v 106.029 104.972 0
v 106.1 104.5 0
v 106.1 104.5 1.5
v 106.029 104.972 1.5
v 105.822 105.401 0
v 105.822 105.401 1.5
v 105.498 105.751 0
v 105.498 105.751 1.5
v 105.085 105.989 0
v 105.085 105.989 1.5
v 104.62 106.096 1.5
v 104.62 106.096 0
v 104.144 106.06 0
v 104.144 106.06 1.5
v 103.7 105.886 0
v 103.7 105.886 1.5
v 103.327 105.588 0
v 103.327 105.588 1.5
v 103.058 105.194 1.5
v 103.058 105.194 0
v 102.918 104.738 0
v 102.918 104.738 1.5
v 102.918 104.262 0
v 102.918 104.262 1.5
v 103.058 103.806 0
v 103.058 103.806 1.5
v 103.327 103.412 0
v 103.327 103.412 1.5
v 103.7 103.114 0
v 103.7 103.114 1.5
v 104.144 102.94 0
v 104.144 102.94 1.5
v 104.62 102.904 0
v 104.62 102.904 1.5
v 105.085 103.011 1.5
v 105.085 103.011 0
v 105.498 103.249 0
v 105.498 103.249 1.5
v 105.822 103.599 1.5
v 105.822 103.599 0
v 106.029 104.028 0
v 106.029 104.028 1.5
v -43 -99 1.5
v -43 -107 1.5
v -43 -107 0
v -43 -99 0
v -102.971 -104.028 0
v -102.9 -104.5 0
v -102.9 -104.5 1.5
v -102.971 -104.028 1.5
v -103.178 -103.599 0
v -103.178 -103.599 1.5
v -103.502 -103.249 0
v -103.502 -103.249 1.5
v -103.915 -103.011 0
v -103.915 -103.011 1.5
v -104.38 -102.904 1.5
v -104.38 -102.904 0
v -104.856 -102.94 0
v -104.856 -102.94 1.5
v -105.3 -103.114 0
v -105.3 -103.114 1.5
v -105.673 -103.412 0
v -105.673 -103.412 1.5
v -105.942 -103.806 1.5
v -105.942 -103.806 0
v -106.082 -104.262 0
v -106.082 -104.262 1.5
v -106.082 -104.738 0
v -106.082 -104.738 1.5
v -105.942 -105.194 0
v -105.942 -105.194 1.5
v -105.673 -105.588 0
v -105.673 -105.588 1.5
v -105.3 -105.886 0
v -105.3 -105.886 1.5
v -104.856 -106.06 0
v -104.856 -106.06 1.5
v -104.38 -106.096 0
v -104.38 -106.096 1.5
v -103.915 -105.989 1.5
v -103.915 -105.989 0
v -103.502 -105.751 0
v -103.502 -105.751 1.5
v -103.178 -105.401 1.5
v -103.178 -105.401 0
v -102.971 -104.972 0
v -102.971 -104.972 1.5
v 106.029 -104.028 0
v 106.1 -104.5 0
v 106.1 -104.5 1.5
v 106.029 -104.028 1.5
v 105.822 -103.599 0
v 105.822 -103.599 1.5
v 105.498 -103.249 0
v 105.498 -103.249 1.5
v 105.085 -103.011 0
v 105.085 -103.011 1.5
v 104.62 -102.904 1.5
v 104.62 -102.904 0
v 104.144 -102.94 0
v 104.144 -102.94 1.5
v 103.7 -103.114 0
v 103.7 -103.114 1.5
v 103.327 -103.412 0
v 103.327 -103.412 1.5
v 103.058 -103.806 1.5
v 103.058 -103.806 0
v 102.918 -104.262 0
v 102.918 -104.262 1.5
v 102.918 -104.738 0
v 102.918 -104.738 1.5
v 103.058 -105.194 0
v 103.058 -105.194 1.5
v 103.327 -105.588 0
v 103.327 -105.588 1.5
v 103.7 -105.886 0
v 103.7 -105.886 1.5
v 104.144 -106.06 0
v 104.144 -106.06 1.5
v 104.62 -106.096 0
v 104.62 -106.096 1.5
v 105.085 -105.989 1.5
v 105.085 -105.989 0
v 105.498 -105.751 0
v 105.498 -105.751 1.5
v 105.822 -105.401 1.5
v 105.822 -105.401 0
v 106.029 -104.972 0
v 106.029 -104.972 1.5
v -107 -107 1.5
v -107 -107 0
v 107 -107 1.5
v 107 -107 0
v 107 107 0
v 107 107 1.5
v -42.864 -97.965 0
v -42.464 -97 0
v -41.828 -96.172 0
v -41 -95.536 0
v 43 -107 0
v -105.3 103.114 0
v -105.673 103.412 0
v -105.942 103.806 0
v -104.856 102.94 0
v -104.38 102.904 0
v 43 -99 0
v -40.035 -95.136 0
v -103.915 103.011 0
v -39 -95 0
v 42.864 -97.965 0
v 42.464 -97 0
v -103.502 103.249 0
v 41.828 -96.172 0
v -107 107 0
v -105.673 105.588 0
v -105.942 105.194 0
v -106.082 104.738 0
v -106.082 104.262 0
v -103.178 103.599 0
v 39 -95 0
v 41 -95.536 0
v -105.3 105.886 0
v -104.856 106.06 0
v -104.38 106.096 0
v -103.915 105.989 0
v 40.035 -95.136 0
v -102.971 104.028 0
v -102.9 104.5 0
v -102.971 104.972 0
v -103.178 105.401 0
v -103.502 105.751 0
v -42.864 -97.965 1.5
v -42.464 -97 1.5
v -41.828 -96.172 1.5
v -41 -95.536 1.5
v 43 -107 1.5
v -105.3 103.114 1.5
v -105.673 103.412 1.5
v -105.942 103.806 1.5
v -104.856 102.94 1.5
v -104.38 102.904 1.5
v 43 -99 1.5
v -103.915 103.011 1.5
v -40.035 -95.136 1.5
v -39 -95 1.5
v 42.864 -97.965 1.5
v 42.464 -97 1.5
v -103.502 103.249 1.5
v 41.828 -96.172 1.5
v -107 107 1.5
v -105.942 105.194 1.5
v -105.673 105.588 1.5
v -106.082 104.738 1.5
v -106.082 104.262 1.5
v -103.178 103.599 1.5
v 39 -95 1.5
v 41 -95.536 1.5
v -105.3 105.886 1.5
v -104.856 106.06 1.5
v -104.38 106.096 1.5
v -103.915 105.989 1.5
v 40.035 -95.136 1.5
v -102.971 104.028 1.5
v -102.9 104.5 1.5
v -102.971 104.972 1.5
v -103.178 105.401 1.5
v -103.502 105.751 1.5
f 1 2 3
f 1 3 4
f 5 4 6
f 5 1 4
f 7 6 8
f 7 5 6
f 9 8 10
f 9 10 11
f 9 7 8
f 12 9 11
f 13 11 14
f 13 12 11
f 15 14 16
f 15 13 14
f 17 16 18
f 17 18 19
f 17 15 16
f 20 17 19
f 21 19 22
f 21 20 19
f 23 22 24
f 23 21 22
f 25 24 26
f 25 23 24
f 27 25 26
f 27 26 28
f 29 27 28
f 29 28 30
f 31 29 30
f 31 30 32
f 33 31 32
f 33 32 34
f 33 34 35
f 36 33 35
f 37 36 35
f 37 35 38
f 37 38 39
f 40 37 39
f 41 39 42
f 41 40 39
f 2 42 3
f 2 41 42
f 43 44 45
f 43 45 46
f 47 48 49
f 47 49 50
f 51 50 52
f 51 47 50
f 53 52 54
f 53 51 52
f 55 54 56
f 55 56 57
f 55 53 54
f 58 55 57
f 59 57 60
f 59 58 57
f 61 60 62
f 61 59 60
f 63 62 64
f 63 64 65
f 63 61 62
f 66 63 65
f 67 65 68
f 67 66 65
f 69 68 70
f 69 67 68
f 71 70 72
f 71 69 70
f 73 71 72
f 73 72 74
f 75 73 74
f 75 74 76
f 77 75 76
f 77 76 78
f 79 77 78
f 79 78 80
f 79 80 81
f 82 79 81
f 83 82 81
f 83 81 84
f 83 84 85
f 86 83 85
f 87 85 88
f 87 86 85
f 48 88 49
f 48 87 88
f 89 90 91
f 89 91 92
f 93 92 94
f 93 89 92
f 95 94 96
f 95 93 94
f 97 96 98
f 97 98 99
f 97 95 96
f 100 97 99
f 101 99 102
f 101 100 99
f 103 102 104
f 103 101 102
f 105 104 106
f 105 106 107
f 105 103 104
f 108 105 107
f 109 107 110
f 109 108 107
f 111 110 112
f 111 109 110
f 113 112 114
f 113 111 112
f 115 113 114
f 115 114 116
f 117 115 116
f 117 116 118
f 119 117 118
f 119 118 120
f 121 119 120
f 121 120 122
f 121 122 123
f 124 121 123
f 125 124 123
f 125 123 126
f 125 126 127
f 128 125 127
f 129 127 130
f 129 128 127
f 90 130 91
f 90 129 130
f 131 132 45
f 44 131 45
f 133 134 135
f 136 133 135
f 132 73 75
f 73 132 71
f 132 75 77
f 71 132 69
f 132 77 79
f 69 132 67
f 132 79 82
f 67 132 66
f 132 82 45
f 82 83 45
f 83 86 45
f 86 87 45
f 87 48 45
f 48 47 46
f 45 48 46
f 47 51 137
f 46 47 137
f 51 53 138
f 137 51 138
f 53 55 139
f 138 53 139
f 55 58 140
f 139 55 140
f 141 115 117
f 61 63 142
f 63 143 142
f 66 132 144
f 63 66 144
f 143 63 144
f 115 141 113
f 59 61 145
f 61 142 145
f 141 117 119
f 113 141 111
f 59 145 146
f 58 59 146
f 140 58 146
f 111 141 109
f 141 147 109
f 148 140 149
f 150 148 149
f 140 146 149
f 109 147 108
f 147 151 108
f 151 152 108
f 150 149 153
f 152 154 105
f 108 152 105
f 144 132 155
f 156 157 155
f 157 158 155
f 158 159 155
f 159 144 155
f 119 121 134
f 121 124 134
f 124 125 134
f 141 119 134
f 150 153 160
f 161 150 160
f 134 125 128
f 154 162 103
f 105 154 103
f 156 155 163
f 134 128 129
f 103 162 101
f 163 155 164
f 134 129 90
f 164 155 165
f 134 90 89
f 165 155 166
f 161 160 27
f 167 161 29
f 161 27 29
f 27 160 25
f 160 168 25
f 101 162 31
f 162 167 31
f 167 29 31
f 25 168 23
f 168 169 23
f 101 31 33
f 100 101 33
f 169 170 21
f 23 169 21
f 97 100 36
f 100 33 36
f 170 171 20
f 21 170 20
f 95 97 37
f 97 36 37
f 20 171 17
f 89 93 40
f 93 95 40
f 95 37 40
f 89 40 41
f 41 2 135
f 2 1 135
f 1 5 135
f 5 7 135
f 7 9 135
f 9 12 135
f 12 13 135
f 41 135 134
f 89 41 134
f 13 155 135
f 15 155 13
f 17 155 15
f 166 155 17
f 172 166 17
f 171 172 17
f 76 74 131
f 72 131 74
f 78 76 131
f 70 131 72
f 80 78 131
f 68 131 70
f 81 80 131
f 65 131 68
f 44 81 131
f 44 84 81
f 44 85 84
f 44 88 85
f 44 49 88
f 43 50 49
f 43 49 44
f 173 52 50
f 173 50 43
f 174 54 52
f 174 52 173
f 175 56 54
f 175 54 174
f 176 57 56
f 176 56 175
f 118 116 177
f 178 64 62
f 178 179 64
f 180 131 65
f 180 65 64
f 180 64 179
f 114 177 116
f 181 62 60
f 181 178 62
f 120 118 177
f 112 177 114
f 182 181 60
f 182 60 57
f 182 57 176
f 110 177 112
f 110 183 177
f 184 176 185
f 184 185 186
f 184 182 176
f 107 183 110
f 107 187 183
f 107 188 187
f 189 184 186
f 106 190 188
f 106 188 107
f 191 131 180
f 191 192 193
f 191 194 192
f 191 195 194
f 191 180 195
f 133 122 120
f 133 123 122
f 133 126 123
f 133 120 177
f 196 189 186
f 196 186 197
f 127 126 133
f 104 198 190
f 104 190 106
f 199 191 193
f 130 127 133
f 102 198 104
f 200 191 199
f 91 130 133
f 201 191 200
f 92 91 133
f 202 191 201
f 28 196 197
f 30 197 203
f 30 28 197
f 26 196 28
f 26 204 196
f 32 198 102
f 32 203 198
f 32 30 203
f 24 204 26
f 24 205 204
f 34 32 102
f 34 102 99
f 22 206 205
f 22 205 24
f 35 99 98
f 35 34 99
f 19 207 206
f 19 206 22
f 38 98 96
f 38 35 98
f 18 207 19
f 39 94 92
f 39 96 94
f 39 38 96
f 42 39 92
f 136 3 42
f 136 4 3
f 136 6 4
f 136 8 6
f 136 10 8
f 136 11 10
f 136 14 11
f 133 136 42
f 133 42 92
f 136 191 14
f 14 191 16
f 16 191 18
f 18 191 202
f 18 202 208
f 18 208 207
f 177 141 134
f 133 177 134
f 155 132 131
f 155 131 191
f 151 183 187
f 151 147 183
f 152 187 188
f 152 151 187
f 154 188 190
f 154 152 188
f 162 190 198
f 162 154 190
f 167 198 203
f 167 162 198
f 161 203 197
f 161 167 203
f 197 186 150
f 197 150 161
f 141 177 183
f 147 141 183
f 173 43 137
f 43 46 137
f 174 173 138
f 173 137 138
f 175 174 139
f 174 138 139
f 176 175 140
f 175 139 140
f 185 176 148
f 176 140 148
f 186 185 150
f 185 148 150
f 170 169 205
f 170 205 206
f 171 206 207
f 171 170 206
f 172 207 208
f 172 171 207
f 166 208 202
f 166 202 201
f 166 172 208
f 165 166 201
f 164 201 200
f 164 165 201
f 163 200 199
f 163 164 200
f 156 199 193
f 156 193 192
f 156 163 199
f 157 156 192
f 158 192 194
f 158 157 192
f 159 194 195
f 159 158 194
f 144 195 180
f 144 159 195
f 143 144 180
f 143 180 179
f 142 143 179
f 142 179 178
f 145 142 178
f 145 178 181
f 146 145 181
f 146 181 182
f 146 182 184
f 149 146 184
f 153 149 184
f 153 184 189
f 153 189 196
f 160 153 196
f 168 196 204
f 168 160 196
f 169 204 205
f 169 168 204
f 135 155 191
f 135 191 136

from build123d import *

# Parameters (mm, degrees)
SKETCH1_W           = 214
SKETCH1_H           = 214
SKETCH1_R           = 1.6
BOSS_EXTRUDE1_DEPTH = 1.5
SKETCH2_W           = 86
SKETCH2_H           = 12
CUT_EXTRUDE1_DEPTH  = 2.5
FILLET1_R           = 4


with BuildPart() as part:
    # Sketch1 → Boss-Extrude1 (new body)
    with BuildSketch(Plane.XY):
        Rectangle(SKETCH1_W, SKETCH1_H)
        with Locations((-104.5, 104.5)):
            Circle(SKETCH1_R, mode=Mode.SUBTRACT)
        with Locations((104.5, 104.5)):
            Circle(SKETCH1_R, mode=Mode.SUBTRACT)
        with Locations((0, -104.5)):
            Circle(SKETCH1_R, mode=Mode.SUBTRACT)
        with Locations((104.5, -104.5)):
            Circle(SKETCH1_R, mode=Mode.SUBTRACT)
        with Locations((-104.5, -104.5)):
            Circle(SKETCH1_R, mode=Mode.SUBTRACT)
    extrude(amount=BOSS_EXTRUDE1_DEPTH)

    # Sketch2 → Cut-Extrude1 (cut, through all)
    with BuildSketch(Plane.XY.offset(1.5)):
        with Locations((0, -101)):
            Rectangle(SKETCH2_W, SKETCH2_H)
    extrude(amount=-CUT_EXTRUDE1_DEPTH, mode=Mode.SUBTRACT)

    # Fillet1
    fillet1_edges = [part.edges().sort_by_distance(p)[0] for p in [
        (-43, -95, 0.75),
        (43, -95, 0.75),
    ]]
    fillet(fillet1_edges, radius=FILLET1_R)


solid = part.part
